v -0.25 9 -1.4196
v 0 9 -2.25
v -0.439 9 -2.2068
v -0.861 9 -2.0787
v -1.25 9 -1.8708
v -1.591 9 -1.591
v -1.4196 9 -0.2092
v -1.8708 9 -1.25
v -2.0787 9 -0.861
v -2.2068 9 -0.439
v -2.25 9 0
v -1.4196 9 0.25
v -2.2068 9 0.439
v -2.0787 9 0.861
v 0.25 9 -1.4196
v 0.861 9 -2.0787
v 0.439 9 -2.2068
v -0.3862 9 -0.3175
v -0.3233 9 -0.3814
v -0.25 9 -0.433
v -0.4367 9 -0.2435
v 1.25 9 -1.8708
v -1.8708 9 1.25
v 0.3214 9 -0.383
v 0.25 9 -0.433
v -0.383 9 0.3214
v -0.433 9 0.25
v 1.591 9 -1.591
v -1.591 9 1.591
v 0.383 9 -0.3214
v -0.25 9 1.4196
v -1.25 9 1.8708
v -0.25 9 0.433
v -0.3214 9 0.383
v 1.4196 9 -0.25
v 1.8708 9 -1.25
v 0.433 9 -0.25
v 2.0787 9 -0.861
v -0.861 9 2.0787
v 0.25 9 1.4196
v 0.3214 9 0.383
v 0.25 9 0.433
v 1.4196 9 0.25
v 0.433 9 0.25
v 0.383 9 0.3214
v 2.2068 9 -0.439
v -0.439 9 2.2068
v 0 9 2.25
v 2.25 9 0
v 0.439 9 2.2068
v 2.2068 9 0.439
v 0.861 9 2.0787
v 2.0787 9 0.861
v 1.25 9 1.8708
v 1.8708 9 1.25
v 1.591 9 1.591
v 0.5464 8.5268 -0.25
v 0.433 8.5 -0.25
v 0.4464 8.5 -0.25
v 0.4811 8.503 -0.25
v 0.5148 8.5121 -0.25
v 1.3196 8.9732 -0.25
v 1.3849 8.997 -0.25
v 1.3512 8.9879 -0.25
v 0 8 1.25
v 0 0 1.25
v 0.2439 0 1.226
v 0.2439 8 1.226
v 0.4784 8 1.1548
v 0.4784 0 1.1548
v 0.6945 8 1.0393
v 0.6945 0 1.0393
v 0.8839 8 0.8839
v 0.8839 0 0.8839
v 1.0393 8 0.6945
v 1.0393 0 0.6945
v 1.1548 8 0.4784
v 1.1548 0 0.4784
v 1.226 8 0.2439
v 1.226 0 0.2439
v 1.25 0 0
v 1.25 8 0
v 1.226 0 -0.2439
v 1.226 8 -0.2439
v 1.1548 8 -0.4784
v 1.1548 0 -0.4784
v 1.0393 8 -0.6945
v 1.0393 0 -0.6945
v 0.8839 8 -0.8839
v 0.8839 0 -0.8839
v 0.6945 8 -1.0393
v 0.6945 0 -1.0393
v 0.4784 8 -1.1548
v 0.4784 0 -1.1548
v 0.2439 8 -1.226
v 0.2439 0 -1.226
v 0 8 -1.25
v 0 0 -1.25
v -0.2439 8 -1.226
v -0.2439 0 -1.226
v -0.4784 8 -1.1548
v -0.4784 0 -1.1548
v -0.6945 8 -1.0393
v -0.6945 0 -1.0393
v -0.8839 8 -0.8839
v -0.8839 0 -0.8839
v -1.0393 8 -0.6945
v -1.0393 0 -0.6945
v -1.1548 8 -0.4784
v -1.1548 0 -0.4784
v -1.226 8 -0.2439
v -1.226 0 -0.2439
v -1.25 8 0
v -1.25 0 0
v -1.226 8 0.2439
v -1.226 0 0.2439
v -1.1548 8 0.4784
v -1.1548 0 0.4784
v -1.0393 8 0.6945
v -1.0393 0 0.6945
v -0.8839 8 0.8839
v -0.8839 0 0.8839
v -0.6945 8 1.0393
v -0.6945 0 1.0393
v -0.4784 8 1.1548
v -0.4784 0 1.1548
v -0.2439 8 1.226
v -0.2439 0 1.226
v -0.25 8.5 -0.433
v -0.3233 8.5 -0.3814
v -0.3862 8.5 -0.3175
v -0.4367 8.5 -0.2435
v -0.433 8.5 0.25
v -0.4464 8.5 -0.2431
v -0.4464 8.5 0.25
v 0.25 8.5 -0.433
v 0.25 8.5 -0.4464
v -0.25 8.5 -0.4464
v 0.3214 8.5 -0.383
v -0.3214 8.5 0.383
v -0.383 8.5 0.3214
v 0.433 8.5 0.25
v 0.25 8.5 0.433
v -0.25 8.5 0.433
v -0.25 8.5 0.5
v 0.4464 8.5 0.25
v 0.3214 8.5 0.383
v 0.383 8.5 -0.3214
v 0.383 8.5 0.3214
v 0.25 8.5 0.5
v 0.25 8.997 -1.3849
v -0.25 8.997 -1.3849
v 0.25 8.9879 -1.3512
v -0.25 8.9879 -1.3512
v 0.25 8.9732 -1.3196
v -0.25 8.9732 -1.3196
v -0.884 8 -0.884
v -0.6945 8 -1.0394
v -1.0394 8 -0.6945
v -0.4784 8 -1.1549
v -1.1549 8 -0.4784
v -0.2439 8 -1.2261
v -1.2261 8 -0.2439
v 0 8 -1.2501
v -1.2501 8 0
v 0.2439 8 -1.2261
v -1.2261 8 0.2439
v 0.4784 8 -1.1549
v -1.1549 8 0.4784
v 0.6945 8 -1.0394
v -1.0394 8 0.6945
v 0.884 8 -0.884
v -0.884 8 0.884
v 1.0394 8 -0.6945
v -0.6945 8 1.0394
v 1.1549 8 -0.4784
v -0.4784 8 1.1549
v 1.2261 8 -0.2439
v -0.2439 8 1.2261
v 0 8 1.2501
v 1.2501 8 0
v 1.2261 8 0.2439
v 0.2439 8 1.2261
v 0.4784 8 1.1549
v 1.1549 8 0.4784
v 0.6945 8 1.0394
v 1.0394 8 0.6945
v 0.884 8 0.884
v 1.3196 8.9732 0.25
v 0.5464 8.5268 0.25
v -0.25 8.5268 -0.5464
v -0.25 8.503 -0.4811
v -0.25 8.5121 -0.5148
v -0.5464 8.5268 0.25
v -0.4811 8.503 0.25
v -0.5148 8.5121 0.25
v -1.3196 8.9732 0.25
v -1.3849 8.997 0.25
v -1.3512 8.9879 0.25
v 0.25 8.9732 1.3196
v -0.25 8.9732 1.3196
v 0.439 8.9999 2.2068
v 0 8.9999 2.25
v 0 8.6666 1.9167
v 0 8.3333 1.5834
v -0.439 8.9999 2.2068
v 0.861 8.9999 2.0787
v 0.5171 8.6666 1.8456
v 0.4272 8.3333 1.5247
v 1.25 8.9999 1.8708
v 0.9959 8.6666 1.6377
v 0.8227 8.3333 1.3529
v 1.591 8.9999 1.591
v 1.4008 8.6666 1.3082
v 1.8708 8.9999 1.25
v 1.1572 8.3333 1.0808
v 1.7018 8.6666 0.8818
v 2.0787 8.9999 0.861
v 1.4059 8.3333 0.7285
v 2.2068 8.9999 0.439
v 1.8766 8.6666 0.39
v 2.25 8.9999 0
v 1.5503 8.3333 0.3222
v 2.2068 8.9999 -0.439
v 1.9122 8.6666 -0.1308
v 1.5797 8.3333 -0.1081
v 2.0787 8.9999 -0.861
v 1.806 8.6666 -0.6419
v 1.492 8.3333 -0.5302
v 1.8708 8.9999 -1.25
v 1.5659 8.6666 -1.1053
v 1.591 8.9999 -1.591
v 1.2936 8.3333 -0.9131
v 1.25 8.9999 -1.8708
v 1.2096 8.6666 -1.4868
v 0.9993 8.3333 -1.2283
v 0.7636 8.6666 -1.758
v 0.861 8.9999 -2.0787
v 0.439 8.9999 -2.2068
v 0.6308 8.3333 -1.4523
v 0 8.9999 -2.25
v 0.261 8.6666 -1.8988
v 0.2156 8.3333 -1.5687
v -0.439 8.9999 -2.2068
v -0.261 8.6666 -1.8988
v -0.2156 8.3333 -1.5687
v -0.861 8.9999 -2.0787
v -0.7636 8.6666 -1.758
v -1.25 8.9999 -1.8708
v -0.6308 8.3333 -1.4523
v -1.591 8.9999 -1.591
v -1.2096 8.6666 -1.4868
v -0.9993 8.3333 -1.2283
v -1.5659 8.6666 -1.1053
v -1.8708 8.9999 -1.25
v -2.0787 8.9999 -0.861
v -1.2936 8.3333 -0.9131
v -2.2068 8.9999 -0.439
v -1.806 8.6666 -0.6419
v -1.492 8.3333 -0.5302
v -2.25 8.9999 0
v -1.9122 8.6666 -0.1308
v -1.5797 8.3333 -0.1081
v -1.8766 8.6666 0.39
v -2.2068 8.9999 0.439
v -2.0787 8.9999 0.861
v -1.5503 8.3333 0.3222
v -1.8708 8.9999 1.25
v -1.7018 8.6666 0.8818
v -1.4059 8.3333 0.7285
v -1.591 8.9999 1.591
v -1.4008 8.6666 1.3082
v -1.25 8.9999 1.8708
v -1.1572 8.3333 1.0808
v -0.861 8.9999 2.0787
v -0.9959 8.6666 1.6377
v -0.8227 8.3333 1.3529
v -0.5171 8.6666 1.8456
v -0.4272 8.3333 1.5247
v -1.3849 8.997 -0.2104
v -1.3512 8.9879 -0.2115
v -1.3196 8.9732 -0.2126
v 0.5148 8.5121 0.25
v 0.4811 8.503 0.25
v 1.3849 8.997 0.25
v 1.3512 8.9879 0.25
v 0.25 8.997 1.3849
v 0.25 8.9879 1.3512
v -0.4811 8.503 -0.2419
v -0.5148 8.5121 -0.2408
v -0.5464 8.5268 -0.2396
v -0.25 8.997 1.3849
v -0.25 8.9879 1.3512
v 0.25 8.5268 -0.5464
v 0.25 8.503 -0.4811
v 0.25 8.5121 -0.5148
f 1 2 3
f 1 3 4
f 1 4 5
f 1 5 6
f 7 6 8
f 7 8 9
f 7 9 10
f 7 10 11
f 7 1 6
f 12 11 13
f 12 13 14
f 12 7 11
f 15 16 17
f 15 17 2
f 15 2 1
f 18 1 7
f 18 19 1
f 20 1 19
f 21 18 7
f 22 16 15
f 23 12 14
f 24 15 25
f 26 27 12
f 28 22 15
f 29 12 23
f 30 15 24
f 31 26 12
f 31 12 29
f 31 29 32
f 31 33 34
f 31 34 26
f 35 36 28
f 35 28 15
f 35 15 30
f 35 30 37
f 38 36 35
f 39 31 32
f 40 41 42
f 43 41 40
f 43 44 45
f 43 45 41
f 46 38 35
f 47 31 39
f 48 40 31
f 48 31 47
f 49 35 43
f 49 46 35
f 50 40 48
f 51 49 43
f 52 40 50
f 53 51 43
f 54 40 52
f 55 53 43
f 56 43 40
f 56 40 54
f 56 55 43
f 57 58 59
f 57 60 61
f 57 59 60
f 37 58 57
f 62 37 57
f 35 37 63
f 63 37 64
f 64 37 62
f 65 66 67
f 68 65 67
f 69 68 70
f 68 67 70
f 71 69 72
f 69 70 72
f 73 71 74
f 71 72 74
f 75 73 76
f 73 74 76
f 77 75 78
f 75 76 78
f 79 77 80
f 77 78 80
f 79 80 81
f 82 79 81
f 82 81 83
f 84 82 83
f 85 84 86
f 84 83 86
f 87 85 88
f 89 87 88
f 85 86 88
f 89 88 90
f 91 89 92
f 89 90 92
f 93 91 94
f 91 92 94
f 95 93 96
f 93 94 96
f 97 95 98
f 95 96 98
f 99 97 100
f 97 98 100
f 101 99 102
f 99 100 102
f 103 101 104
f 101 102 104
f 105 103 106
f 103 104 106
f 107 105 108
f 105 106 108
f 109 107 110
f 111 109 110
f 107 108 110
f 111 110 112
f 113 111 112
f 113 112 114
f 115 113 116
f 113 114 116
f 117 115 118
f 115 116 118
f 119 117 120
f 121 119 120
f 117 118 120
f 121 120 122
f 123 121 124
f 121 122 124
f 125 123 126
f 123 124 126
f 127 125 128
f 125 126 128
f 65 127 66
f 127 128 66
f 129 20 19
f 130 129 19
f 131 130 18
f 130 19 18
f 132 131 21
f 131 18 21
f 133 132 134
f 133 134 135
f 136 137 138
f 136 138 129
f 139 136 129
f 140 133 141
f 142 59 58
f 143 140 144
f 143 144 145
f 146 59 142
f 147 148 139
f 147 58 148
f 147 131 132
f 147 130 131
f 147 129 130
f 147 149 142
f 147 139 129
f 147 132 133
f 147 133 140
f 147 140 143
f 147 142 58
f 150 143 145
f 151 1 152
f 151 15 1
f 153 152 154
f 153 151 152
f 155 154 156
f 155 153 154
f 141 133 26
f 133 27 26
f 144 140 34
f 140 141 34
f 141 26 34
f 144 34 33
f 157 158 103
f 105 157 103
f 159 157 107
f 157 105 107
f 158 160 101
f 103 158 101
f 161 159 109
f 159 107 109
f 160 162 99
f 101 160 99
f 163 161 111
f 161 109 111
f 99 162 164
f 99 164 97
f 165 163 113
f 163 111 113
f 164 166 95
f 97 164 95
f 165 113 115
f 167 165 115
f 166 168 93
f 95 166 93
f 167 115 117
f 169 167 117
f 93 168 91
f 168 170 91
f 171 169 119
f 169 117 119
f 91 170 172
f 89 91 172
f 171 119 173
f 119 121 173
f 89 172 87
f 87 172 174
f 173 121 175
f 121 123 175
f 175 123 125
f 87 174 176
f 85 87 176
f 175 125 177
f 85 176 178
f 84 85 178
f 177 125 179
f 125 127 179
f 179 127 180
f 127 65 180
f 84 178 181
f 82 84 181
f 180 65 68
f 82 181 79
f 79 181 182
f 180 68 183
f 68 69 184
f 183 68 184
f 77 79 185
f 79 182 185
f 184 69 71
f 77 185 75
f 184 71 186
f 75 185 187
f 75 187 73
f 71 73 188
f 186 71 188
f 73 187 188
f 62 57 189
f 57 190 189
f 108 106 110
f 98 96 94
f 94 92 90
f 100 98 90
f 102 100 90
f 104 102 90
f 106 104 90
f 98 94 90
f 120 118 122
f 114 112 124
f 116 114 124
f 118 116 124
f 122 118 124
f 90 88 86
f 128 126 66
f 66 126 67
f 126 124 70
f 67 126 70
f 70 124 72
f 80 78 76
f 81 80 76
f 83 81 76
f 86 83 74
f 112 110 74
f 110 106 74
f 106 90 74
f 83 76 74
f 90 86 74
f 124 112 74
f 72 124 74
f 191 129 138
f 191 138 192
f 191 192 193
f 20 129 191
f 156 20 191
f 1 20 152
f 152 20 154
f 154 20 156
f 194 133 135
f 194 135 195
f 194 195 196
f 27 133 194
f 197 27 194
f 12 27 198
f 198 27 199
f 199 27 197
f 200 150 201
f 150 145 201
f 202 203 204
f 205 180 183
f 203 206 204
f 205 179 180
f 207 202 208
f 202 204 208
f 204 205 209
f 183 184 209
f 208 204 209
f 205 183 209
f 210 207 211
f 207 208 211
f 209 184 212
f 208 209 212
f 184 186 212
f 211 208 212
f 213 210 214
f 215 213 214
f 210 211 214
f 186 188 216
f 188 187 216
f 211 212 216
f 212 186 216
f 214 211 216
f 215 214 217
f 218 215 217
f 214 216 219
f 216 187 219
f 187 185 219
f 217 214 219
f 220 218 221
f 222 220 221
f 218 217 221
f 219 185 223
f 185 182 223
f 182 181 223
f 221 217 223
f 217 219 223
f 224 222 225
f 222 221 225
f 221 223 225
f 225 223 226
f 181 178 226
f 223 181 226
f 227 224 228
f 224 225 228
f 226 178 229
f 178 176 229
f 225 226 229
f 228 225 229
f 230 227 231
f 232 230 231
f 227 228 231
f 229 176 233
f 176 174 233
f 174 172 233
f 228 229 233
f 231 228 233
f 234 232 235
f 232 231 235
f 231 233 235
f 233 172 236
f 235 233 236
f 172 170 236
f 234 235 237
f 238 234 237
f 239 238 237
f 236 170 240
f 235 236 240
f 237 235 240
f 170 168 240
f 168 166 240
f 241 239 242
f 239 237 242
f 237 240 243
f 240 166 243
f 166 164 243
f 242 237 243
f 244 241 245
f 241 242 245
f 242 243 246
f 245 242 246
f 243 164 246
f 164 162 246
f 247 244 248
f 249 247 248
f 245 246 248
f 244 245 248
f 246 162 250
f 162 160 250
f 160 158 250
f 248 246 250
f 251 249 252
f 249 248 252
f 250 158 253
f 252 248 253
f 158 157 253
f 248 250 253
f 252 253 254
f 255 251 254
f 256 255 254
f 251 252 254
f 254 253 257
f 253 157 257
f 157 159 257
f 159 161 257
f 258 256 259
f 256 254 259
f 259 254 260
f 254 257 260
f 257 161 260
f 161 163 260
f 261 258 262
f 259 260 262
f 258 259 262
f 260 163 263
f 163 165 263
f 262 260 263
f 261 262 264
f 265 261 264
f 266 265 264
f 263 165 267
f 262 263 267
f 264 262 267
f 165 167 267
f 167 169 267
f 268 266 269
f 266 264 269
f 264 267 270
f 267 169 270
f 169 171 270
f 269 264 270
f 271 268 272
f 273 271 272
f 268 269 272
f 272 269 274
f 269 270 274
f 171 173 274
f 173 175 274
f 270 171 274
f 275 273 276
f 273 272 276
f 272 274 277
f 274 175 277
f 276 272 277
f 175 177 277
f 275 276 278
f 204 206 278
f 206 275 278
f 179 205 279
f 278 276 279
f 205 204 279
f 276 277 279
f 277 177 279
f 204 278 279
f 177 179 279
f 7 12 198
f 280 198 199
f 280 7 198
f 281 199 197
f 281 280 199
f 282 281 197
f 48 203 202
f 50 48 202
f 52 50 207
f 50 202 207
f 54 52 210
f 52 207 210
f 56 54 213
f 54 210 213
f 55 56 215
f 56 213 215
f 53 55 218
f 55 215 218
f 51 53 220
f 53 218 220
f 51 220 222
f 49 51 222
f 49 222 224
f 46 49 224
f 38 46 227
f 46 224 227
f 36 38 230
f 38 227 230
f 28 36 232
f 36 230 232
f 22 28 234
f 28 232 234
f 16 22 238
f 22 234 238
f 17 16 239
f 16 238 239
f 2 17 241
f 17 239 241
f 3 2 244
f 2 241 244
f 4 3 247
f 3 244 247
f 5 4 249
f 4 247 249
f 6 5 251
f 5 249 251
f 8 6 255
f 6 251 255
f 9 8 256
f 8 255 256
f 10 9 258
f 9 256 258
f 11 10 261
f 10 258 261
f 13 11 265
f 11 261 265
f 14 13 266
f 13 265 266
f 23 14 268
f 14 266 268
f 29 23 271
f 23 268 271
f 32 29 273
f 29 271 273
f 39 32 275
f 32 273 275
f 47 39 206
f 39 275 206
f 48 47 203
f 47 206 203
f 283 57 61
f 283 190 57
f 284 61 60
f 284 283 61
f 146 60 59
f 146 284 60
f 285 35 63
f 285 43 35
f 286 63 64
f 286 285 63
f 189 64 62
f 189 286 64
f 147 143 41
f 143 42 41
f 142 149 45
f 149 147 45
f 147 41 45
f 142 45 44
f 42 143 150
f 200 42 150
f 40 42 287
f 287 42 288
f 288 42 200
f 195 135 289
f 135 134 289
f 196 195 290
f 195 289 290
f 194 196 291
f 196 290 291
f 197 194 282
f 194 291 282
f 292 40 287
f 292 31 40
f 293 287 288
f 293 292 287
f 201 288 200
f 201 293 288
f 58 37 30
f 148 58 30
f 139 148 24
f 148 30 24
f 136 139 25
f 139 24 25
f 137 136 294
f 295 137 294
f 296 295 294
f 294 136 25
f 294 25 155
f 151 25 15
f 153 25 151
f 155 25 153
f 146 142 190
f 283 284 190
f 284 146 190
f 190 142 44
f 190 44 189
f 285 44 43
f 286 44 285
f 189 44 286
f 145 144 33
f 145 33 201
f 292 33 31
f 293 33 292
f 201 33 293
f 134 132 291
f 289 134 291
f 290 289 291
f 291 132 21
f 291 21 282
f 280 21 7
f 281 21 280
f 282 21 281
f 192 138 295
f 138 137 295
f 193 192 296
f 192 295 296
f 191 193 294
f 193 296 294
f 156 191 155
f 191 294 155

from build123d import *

# Parameters (mm, degrees)
SKETCH1_R           = 1.25
BOSS_EXTRUDE1_DEPTH = 8
SKETCH3_R           = 2.25
BOSS_EXTRUDE2_DEPTH = 1
CHAMFER3_SIZE       = 1
SKETCH4_R           = 0.5
CUT_EXTRUDE1_DEPTH  = 0.5
CUT_EXTRUDE2_DEPTH  = 0.25
CIRPATTERN1_COUNT   = 4
DRAFT1_ANGLE        = 2
FILLET4_R           = 0.2


with BuildPart() as part:
    # Sketch1 → Boss-Extrude1 (new body)
    with BuildSketch(Plane(origin=(0, 0, 0), x_dir=(1, 0, 0), z_dir=(0, 1, 0))):
        with Locations(Location((0, 0, 0), (0, 0, 270))):
            Circle(SKETCH1_R)
    extrude(amount=BOSS_EXTRUDE1_DEPTH)

    # Sketch3 → Boss-Extrude2 (add)
    with BuildSketch(Plane(origin=(0, 8, 0), x_dir=(1, 0, 0), z_dir=(0, 1, 0))):
        with Locations(Location((0, 0, 0), (0, 0, 270))):
            Circle(SKETCH3_R)
    extrude(amount=BOSS_EXTRUDE2_DEPTH)

    # Chamfer3
    chamfer3_edges = [part.edges().sort_by_distance(p)[0] for p in [
        (0, 8, -2.25),
    ]]
    chamfer(chamfer3_edges, length=CHAMFER3_SIZE - 0.0001)  # a hair under: the kernel refuses the full size

    # Sketch4 → Cut-Extrude1 (cut)
    with BuildSketch(Plane(origin=(0, 9, 0), x_dir=(1, 0, 0), z_dir=(0, 1, 0))):
        with Locations(Location((0, 0, 0), (0, 0, 270))):
            Circle(SKETCH4_R)
    extrude(amount=-CUT_EXTRUDE1_DEPTH, mode=Mode.SUBTRACT)

    # Sketch5 → Cut-Extrude2 (cut, symmetric)
    with BuildSketch(Plane.XY):
        Polygon((0.5, 8.5), (1.366025404, 9), (0.5, 9), (0.25, 9), (0.25, 8.5), align=None)
    cut_extrude2 = extrude(amount=CUT_EXTRUDE2_DEPTH, both=True, mode=Mode.SUBTRACT)

    # CirPattern1: Cut-Extrude2 ×4 about axis
    cirpattern1_axis = Axis((0, 0, 0), (0, 1, 0))
    for i in range(1, CIRPATTERN1_COUNT):
        add(cut_extrude2.rotate(cirpattern1_axis, i * 360 / CIRPATTERN1_COUNT), mode=Mode.SUBTRACT)

    # Draft1
    draft1_faces = [part.faces().sort_by_distance(p)[0] for p in [
        (-0.745512702, 8.822168784, -0.25),
    ]]
    draft(draft1_faces, Plane(origin=(-0.25, 0, 0), x_dir=(0, 0, 1), z_dir=(1, 0, 0)), DRAFT1_ANGLE)

    # Fillet4
    fillet4_edges = [part.edges().sort_by_distance(p)[0] for p in [
        (0.5, 8.5, 0),
        (1.366025404, 9, 0),
        (0, 8.5, -0.5),
        (0, 9, -1.366025404),
        (0, 9, 1.366025404),
        (-0.5, 8.5, 0.004365096),
        (-1.366025404, 9, 0.019486233),
    ]]
    fillet(fillet4_edges, radius=FILLET4_R)


solid = part.part
